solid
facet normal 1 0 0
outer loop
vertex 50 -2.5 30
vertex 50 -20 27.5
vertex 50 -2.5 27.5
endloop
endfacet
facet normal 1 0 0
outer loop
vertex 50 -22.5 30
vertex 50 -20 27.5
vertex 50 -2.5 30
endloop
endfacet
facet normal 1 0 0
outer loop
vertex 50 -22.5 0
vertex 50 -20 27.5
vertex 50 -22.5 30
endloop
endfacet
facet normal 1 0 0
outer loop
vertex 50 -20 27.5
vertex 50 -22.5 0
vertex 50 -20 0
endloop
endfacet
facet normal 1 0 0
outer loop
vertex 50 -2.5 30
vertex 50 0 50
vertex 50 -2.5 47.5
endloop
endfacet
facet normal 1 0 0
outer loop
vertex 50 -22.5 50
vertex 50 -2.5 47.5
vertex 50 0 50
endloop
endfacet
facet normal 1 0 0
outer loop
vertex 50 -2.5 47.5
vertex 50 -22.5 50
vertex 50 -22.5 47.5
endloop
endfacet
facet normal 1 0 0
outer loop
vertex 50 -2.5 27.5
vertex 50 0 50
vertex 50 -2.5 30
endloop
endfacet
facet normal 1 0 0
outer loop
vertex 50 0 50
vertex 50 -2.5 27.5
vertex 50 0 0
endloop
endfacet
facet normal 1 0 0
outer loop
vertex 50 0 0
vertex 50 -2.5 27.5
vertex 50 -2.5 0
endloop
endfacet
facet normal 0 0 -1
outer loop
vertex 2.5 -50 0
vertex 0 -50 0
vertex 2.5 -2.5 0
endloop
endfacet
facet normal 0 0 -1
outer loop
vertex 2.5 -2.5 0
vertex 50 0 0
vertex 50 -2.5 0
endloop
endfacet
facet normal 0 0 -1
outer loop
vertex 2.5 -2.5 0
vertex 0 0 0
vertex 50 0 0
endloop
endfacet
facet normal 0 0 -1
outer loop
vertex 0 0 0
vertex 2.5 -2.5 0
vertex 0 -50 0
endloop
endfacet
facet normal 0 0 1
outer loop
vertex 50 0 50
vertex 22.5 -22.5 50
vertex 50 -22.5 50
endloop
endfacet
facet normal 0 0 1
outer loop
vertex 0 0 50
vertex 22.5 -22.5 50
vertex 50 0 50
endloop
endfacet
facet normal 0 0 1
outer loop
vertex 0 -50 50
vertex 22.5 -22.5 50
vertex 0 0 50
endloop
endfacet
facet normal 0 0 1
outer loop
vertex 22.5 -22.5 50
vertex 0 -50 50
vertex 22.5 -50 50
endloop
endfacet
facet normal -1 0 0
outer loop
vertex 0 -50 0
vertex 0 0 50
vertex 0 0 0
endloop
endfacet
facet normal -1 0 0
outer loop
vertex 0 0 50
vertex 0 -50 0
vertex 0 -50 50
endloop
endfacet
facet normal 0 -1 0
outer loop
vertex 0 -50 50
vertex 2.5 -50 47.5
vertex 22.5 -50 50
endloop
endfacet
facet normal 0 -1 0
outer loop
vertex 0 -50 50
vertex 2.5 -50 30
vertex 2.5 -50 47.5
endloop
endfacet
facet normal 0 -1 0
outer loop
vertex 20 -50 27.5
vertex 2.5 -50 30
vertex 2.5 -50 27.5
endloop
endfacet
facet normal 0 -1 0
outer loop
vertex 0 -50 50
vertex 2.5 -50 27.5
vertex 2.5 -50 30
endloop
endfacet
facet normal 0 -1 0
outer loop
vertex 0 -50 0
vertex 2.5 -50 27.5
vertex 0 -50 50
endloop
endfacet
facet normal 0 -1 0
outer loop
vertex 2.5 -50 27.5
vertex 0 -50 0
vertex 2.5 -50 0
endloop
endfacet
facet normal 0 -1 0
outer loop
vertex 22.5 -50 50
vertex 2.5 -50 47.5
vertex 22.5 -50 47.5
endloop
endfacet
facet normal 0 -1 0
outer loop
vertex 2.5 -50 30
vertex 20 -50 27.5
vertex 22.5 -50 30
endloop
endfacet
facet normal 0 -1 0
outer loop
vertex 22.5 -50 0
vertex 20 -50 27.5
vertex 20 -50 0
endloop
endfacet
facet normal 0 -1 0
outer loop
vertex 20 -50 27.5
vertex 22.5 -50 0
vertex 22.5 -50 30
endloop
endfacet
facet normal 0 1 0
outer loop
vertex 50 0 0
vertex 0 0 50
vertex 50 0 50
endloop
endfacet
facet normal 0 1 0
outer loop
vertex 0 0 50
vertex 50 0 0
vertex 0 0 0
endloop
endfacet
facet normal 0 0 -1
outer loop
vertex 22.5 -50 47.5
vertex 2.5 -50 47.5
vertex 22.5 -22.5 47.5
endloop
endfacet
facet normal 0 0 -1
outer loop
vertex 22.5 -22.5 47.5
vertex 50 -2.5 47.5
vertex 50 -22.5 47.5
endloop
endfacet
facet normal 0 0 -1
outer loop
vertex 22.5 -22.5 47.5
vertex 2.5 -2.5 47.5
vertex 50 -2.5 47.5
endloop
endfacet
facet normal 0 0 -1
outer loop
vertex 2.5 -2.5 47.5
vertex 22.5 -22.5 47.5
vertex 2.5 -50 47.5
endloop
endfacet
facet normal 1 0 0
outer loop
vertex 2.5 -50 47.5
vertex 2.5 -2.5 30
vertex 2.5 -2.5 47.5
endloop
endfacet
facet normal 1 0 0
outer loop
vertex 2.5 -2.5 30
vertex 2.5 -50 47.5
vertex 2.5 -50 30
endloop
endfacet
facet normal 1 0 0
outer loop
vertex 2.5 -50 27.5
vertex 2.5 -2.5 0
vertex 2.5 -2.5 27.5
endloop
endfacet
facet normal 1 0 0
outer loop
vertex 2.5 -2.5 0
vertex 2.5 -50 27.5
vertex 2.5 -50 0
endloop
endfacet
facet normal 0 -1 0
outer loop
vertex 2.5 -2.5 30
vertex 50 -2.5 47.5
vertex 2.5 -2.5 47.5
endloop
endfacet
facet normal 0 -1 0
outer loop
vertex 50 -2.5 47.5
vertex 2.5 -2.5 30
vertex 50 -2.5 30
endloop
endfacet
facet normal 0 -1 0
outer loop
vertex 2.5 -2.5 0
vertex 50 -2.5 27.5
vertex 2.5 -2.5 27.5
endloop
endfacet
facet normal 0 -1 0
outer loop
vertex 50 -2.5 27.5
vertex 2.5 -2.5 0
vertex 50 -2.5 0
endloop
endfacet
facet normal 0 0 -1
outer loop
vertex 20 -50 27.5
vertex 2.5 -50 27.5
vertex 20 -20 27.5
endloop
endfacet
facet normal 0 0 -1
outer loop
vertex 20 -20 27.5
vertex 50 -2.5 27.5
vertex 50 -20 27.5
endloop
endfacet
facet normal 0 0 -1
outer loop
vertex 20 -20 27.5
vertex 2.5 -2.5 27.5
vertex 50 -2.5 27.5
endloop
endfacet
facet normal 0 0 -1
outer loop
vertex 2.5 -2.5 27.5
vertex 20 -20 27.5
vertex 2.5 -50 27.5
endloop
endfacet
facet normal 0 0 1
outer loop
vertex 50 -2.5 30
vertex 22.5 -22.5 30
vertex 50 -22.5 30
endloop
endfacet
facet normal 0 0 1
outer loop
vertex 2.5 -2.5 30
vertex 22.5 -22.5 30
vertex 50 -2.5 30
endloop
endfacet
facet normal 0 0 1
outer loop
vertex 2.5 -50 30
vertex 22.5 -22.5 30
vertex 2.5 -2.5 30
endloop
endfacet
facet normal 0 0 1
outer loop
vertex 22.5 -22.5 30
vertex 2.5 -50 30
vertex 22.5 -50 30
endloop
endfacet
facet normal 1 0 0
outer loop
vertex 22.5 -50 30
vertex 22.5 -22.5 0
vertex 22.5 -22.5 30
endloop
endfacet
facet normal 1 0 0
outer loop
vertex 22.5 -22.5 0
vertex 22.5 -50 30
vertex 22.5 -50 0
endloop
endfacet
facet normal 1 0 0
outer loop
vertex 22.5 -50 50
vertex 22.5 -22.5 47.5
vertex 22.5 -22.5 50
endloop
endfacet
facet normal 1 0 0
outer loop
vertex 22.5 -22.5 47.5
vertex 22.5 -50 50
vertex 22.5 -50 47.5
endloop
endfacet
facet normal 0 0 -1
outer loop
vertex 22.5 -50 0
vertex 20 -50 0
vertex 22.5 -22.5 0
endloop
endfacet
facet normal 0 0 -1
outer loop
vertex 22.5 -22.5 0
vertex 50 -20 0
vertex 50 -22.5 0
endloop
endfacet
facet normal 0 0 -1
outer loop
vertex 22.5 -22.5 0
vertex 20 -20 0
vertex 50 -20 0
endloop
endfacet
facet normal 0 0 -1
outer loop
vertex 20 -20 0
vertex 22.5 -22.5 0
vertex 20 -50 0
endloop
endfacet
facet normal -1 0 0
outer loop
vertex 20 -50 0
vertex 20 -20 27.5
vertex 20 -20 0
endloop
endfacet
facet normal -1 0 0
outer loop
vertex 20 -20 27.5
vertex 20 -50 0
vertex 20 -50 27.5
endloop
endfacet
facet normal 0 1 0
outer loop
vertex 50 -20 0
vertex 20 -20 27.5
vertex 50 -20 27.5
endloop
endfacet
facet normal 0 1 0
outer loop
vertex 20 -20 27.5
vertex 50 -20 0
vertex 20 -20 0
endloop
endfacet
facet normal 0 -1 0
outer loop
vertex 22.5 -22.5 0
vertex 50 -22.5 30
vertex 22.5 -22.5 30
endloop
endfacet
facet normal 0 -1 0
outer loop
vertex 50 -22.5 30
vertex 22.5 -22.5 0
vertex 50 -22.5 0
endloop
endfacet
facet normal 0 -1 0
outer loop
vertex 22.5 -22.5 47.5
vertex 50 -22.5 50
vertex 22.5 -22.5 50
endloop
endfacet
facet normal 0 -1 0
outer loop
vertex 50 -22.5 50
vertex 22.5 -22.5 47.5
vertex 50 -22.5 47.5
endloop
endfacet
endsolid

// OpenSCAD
//Variables

// Thickness of the Board
board_thickness = 17.5;  //[1:30]

// Size of the cube to bound the object.  This is the Height, Width, and Depth.
cube_size = 50;

// Wall Thickness.  This is the wall thickness.
wall_thickness = 2.5;


// Object Assembly.  Object is built upside down, then rotated for proper print orientation.

translate([0,0,cube_size]) rotate([180,0,0]) difference(){
union(){
difference() {
    cube(size=cube_size);
    translate([wall_thickness, wall_thickness, wall_thickness]) cube(size=cube_size);
}
translate([0,0,wall_thickness+board_thickness]) cube([cube_size, cube_size,wall_thickness]);
translate([wall_thickness+board_thickness,board_thickness+wall_thickness,wall_thickness+board_thickness]) cube([wall_thickness, cube_size-wall_thickness-board_thickness,cube_size-(board_thickness+wall_thickness)]);
translate([board_thickness+wall_thickness,wall_thickness+board_thickness,wall_thickness+board_thickness]) cube([cube_size-wall_thickness-board_thickness, wall_thickness, cube_size-(board_thickness+wall_thickness)]);
}
translate([board_thickness+2*wall_thickness,2*wall_thickness+board_thickness,0]) cube(size=cube_size);
}
